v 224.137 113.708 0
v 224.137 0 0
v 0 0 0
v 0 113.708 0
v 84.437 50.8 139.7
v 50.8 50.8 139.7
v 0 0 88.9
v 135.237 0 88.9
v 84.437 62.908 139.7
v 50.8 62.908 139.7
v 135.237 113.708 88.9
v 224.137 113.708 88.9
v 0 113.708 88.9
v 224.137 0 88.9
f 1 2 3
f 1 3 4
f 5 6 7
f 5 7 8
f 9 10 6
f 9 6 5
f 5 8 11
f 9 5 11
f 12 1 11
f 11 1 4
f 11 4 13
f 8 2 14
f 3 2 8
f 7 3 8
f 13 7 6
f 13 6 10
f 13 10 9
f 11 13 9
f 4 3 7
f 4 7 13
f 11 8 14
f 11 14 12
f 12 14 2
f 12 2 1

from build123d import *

# Parameters (mm, degrees)
F0_W     = 135.237008
F0_H     = 113.707788
F1_DEPTH = 139.7
F2_SIZE  = 50.8
F3_W     = 113.707788
F3_H     = 88.9
F4_DEPTH = 88.9


with BuildPart() as f1:
    # F0 (on Top) → F1 (new body)
    with BuildSketch(Plane.XY):
        with Locations((67.618504, 56.853894)):
            Rectangle(F0_W, F0_H)
    extrude(amount=F1_DEPTH)

    # F2
    f2_edges = [f1.edges().sort_by_distance(p)[0] for p in [
        (0, 56.853894, 139.7),
        (67.618504, 0, 139.7),
        (135.237008, 56.853894, 139.7),
        (67.618504, 113.707788, 139.7),
    ]]
    chamfer(f2_edges, length=F2_SIZE)

    # F3 (on face) → F4 (join)
    with BuildSketch(Plane.YZ.offset(135.237008)):
        with Locations((56.853894, 44.45)):
            Rectangle(F3_W, F3_H)
    extrude(amount=F4_DEPTH)


solid = f1.part
